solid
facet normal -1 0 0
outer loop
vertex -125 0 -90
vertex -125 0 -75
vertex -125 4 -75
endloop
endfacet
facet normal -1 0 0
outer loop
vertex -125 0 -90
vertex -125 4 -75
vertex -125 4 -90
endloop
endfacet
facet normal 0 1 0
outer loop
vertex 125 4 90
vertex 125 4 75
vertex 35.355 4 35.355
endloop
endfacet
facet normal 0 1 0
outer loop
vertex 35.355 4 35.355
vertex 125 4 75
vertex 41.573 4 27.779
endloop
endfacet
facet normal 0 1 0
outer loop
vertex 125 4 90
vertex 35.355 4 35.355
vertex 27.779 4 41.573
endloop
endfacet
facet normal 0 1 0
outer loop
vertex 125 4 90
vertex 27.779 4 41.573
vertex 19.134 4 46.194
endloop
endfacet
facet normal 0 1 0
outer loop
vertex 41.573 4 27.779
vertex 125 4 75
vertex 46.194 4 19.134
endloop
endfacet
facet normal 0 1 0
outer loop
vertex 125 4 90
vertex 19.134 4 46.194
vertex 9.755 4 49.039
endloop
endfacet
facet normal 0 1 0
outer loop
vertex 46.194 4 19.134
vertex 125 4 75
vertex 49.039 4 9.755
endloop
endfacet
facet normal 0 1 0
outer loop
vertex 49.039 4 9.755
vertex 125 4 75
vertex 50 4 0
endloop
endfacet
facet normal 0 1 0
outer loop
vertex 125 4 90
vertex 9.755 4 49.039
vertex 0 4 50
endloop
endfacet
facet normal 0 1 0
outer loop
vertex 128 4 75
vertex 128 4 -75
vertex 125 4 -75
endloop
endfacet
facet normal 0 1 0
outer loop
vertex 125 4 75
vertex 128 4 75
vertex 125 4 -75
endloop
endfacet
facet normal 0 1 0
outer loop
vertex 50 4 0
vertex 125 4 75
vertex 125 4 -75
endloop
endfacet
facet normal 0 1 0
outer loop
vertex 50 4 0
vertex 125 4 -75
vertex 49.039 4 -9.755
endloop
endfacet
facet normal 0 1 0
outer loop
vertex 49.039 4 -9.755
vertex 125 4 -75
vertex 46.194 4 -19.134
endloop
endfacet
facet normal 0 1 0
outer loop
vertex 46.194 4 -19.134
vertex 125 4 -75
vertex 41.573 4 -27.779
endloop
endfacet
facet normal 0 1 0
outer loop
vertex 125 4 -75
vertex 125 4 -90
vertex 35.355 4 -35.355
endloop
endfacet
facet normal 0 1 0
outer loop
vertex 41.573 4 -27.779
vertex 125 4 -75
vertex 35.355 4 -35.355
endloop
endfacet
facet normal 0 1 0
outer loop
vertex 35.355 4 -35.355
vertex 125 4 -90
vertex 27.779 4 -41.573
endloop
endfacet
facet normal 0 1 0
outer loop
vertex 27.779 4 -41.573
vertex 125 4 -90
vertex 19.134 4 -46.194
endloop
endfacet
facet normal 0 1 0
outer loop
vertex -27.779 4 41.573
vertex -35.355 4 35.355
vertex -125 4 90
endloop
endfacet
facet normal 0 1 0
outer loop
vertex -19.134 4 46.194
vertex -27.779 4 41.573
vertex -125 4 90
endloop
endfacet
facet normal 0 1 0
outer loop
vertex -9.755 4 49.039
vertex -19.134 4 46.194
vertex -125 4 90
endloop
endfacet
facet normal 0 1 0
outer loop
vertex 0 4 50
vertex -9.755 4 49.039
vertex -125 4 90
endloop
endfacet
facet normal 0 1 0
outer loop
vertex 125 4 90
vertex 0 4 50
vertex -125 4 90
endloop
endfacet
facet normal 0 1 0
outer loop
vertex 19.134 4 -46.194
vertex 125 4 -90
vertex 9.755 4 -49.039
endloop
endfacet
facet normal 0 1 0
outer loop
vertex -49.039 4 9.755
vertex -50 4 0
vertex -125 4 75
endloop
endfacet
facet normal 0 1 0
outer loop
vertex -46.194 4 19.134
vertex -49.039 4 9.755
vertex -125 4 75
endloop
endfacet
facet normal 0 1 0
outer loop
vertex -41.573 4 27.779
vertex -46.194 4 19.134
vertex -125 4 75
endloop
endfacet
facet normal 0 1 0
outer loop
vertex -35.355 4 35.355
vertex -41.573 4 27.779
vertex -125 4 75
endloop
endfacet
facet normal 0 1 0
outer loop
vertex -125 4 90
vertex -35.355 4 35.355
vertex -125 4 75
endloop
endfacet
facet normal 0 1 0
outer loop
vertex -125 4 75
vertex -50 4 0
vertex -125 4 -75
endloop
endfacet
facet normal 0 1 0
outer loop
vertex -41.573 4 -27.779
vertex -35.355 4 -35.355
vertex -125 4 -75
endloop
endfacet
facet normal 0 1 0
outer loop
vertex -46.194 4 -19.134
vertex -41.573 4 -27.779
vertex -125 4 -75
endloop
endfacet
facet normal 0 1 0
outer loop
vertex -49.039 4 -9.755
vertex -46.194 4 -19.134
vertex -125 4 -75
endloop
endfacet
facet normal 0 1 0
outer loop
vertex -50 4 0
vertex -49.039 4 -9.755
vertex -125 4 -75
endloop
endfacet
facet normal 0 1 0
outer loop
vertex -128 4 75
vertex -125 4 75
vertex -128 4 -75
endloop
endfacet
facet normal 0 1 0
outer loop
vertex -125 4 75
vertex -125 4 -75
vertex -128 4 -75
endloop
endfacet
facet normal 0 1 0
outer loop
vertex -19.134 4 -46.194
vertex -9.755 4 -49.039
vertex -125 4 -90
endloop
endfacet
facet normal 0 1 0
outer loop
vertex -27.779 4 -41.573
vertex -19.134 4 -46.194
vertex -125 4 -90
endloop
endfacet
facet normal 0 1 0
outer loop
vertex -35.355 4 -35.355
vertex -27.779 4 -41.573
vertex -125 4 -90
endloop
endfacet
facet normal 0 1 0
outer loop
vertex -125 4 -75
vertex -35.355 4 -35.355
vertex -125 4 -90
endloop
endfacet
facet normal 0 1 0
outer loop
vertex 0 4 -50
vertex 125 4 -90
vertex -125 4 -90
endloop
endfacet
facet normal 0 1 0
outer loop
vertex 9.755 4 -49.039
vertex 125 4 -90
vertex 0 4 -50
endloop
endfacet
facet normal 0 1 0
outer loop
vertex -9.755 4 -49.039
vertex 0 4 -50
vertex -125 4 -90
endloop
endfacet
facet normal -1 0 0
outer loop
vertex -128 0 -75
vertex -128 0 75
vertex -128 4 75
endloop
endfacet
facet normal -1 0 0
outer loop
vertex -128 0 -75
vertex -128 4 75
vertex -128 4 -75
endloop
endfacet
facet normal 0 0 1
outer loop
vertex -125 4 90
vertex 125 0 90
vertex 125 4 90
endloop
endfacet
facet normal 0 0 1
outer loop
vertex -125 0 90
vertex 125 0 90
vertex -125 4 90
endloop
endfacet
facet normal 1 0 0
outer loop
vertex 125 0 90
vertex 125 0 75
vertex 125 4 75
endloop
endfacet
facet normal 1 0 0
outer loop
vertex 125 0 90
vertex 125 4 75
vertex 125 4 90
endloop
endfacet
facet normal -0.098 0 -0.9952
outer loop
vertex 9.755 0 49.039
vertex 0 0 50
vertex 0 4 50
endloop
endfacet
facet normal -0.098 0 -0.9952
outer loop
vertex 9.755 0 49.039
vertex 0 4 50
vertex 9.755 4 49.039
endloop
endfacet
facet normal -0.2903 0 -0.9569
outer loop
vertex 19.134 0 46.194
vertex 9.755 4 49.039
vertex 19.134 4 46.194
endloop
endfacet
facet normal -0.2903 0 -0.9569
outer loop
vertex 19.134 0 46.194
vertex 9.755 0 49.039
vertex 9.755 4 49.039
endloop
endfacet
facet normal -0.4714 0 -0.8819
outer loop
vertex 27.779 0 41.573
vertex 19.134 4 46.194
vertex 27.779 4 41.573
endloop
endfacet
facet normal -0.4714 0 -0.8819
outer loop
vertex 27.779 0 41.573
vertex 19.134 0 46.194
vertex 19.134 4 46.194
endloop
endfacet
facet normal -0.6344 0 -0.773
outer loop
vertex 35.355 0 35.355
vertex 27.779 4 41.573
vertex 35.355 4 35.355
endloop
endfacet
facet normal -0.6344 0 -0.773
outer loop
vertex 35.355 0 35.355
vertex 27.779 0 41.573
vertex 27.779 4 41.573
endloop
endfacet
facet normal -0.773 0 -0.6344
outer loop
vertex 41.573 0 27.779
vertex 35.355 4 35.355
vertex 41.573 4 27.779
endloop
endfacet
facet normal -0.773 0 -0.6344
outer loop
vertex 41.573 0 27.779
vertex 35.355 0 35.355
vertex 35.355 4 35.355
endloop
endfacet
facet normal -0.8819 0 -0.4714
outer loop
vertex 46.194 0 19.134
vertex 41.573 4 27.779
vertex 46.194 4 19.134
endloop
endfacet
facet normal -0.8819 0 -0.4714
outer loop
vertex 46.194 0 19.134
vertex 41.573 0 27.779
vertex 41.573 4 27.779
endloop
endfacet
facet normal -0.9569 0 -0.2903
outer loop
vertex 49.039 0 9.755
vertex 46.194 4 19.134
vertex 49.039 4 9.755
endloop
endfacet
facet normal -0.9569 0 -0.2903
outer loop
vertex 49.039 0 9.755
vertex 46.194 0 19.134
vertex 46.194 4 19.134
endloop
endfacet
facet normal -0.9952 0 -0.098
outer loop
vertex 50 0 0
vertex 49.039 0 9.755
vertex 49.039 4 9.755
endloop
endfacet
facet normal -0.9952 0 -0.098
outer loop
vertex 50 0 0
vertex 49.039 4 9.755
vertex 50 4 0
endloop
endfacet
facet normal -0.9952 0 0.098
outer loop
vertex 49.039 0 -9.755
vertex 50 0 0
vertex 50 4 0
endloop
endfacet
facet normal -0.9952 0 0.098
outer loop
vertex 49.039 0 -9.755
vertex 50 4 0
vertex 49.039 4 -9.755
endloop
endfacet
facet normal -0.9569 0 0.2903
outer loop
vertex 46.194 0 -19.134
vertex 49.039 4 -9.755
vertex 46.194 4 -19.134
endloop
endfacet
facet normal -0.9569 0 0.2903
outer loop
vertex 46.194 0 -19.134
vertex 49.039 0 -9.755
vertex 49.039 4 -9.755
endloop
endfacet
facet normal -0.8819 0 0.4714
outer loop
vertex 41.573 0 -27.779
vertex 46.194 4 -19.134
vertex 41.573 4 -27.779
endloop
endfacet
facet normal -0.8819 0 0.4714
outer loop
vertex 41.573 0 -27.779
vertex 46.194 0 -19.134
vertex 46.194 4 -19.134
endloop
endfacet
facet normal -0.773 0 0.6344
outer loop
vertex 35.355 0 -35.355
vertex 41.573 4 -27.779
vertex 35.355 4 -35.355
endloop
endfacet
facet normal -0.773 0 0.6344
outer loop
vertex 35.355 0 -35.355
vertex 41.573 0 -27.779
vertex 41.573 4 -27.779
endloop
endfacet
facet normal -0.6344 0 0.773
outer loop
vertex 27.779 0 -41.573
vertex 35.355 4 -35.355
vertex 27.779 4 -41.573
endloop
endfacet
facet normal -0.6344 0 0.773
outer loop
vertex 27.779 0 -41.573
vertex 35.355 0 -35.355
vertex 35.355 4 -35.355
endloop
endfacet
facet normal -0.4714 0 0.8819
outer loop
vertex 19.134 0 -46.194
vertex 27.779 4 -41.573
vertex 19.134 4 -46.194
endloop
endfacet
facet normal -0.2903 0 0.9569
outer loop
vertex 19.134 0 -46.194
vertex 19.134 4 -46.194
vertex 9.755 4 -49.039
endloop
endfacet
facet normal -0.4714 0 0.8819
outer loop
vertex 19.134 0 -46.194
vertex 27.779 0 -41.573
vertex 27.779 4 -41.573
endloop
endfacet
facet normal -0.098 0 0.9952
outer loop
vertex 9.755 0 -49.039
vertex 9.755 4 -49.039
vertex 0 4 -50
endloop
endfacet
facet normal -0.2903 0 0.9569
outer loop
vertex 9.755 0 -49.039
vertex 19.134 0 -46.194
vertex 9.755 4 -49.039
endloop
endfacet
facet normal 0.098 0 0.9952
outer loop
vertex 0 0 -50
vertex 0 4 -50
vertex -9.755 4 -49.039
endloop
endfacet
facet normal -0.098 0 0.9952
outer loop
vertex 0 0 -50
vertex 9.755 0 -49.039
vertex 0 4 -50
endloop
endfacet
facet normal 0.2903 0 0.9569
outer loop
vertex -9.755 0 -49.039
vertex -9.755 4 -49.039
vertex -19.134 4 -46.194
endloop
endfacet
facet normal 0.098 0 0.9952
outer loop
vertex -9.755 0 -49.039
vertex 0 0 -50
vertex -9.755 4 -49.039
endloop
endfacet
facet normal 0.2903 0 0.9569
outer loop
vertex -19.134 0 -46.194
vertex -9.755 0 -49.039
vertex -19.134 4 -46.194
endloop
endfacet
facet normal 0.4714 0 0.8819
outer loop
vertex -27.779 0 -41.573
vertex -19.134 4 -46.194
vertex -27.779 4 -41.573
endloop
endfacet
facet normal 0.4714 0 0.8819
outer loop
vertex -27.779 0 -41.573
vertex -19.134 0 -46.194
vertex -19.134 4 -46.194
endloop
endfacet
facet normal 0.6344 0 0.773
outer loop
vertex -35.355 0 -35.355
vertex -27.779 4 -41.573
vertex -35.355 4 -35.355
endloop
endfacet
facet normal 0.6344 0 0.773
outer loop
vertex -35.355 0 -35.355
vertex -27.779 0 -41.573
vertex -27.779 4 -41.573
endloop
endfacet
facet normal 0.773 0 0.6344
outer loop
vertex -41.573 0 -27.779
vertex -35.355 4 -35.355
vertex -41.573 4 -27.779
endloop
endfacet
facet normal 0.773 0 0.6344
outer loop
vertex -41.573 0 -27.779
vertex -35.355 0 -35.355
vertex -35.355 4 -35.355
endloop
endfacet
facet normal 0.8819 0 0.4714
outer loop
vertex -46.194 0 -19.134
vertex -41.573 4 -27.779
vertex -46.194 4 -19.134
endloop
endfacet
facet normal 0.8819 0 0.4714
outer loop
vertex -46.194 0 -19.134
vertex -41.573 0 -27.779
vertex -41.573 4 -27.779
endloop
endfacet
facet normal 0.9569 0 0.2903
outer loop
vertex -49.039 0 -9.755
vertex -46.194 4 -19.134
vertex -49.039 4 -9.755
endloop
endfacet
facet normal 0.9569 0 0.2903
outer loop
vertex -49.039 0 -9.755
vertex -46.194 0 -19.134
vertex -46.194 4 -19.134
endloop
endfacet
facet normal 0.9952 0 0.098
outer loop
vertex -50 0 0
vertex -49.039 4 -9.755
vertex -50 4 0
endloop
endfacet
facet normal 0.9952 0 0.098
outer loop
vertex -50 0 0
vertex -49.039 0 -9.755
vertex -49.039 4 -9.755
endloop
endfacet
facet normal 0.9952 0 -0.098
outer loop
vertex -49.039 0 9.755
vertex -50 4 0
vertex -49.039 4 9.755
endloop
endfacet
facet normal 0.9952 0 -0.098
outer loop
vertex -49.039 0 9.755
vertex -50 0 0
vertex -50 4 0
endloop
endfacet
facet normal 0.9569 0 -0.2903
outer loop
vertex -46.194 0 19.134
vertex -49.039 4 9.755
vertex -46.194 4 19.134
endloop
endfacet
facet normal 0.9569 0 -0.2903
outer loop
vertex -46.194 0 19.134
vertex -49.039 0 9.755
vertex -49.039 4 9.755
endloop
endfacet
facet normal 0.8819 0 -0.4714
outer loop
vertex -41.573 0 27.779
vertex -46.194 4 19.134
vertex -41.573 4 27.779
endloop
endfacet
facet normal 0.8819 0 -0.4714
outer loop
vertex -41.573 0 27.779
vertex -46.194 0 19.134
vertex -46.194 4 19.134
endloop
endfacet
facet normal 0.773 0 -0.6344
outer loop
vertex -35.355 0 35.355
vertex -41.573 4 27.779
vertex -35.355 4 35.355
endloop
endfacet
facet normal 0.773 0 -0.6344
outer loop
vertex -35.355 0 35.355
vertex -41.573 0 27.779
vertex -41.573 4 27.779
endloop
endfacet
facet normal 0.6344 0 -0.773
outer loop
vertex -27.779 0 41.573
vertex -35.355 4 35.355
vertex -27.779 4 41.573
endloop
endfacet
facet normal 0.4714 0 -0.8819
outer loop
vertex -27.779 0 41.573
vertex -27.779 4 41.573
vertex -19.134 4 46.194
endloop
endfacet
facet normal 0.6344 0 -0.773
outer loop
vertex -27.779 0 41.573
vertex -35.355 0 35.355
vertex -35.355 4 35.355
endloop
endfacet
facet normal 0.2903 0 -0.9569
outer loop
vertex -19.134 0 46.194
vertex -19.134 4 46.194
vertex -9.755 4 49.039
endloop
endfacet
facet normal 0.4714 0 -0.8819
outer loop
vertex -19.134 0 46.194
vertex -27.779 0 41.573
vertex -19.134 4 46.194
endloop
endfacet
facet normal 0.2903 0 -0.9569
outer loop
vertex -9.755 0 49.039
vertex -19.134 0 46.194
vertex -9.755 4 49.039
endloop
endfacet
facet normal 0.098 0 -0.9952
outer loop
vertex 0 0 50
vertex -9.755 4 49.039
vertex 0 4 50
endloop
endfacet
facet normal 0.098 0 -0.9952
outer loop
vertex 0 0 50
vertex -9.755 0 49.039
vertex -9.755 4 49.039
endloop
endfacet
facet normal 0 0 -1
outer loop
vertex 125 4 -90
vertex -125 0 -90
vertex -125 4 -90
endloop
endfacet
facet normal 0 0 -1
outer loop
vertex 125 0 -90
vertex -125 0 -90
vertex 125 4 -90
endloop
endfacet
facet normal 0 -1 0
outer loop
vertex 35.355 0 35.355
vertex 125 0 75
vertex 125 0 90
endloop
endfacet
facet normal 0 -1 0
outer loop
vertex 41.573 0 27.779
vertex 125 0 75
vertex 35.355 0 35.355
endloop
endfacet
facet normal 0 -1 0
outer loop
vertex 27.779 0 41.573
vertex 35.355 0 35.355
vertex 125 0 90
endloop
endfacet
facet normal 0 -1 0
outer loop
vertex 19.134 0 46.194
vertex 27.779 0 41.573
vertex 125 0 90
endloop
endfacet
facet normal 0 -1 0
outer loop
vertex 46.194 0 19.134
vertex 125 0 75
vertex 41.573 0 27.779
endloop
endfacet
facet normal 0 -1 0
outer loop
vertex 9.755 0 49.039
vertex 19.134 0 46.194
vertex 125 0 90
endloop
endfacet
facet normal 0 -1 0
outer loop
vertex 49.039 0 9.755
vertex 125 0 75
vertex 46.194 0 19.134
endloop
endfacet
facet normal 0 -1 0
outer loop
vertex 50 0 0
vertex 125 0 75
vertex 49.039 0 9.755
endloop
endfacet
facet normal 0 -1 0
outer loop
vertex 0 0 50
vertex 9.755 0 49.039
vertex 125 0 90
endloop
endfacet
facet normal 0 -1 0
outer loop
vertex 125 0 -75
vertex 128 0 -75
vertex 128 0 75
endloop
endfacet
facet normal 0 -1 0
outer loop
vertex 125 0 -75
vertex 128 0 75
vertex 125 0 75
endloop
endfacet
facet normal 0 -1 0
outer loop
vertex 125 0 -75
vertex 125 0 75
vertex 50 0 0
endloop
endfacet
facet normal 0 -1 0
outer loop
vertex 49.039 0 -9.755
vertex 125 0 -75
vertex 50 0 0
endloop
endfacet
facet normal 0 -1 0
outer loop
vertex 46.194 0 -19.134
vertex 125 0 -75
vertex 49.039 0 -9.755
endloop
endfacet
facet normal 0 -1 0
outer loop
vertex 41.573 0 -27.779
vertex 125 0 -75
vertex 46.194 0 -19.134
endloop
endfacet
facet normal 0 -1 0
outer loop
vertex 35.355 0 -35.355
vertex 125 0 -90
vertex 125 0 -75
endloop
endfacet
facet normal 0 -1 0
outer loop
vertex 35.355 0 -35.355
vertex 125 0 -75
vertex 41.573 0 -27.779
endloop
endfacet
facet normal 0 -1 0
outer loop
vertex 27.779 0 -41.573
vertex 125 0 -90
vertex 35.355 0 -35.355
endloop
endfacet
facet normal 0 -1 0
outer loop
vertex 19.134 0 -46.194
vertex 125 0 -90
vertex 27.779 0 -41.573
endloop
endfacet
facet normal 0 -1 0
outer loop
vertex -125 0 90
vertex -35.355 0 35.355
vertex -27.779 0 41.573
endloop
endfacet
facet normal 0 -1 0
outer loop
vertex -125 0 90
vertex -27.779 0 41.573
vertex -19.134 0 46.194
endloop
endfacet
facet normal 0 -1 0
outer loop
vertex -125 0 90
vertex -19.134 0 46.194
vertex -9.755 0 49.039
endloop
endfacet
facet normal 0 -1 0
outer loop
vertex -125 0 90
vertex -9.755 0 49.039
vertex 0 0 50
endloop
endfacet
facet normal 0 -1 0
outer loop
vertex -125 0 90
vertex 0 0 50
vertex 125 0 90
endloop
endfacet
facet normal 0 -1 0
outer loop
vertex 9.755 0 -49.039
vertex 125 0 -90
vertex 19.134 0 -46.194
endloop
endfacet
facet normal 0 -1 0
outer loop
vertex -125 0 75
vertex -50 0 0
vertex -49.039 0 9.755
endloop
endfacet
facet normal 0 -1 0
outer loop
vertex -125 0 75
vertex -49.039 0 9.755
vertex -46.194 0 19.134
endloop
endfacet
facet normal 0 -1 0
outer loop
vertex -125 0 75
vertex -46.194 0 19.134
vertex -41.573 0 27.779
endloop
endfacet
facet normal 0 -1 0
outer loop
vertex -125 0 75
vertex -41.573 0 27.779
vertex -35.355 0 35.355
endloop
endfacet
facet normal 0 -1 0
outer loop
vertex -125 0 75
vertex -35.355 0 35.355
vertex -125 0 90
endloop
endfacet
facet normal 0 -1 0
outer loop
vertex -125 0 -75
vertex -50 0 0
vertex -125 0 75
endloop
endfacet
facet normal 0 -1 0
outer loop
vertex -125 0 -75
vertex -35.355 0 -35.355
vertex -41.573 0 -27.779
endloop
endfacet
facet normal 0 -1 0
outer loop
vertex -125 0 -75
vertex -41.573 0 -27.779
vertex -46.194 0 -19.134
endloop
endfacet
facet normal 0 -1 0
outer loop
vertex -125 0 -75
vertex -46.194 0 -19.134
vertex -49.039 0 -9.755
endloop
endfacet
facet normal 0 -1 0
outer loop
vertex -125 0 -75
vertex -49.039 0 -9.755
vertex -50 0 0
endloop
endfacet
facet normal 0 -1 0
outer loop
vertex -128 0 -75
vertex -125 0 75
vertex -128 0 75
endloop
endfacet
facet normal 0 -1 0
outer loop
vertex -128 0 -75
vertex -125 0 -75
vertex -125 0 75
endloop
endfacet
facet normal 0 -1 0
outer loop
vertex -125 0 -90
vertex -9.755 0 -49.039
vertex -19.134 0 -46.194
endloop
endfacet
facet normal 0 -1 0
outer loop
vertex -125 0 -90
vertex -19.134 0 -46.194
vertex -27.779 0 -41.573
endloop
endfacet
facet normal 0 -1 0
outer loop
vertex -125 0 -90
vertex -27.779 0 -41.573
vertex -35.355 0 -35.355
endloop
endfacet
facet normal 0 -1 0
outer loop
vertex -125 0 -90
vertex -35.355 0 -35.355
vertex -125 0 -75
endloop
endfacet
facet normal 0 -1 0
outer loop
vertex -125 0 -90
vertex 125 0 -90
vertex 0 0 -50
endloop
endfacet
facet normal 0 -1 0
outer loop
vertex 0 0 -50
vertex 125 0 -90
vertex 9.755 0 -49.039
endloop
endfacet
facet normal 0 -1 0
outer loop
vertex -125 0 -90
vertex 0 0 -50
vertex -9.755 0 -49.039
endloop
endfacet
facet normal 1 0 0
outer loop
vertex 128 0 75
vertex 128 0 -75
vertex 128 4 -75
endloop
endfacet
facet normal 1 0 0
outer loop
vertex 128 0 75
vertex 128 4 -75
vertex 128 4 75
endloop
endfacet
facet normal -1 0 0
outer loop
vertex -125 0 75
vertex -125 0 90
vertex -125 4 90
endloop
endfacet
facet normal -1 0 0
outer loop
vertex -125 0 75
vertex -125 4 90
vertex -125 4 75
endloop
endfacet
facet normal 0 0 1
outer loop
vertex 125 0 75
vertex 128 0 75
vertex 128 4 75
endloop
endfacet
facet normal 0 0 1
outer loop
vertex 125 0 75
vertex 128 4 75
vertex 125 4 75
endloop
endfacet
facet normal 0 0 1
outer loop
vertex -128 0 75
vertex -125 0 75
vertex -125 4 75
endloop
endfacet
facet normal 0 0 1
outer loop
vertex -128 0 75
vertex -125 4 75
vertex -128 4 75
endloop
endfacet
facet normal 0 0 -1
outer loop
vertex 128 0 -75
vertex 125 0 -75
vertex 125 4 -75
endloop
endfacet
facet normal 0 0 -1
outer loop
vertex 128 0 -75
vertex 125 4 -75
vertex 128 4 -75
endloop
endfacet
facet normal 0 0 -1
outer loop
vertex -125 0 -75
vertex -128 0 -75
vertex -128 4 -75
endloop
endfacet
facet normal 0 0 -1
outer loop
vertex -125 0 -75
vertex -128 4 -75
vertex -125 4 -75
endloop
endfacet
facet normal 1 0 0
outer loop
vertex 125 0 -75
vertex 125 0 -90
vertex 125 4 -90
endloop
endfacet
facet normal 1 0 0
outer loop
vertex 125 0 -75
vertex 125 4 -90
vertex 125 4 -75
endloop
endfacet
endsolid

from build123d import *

# Parameters (mm, degrees)
SKETCH_4_R      = 50
EXTRUDE_3_DEPTH = 4


with BuildPart() as part:
    # 草图4 → 凸台-拉伸3 (new body)
    with BuildSketch(Plane(origin=(0, 0, 0), x_dir=(1, 0, 0), z_dir=(0, 1, 0))):
        Polygon((-125, 75), (-125, 90), (125, 90), (125, 75), (128, 75), (128, -75), (125, -75), (125, -90), (-125, -90), (-125, -75), (-128, -75), (-128, 75), align=None)
        with Locations(Location((0, 0, 0), (0, 0, 270))):
            Circle(SKETCH_4_R, mode=Mode.SUBTRACT)
    extrude(amount=EXTRUDE_3_DEPTH)


solid = part.part
